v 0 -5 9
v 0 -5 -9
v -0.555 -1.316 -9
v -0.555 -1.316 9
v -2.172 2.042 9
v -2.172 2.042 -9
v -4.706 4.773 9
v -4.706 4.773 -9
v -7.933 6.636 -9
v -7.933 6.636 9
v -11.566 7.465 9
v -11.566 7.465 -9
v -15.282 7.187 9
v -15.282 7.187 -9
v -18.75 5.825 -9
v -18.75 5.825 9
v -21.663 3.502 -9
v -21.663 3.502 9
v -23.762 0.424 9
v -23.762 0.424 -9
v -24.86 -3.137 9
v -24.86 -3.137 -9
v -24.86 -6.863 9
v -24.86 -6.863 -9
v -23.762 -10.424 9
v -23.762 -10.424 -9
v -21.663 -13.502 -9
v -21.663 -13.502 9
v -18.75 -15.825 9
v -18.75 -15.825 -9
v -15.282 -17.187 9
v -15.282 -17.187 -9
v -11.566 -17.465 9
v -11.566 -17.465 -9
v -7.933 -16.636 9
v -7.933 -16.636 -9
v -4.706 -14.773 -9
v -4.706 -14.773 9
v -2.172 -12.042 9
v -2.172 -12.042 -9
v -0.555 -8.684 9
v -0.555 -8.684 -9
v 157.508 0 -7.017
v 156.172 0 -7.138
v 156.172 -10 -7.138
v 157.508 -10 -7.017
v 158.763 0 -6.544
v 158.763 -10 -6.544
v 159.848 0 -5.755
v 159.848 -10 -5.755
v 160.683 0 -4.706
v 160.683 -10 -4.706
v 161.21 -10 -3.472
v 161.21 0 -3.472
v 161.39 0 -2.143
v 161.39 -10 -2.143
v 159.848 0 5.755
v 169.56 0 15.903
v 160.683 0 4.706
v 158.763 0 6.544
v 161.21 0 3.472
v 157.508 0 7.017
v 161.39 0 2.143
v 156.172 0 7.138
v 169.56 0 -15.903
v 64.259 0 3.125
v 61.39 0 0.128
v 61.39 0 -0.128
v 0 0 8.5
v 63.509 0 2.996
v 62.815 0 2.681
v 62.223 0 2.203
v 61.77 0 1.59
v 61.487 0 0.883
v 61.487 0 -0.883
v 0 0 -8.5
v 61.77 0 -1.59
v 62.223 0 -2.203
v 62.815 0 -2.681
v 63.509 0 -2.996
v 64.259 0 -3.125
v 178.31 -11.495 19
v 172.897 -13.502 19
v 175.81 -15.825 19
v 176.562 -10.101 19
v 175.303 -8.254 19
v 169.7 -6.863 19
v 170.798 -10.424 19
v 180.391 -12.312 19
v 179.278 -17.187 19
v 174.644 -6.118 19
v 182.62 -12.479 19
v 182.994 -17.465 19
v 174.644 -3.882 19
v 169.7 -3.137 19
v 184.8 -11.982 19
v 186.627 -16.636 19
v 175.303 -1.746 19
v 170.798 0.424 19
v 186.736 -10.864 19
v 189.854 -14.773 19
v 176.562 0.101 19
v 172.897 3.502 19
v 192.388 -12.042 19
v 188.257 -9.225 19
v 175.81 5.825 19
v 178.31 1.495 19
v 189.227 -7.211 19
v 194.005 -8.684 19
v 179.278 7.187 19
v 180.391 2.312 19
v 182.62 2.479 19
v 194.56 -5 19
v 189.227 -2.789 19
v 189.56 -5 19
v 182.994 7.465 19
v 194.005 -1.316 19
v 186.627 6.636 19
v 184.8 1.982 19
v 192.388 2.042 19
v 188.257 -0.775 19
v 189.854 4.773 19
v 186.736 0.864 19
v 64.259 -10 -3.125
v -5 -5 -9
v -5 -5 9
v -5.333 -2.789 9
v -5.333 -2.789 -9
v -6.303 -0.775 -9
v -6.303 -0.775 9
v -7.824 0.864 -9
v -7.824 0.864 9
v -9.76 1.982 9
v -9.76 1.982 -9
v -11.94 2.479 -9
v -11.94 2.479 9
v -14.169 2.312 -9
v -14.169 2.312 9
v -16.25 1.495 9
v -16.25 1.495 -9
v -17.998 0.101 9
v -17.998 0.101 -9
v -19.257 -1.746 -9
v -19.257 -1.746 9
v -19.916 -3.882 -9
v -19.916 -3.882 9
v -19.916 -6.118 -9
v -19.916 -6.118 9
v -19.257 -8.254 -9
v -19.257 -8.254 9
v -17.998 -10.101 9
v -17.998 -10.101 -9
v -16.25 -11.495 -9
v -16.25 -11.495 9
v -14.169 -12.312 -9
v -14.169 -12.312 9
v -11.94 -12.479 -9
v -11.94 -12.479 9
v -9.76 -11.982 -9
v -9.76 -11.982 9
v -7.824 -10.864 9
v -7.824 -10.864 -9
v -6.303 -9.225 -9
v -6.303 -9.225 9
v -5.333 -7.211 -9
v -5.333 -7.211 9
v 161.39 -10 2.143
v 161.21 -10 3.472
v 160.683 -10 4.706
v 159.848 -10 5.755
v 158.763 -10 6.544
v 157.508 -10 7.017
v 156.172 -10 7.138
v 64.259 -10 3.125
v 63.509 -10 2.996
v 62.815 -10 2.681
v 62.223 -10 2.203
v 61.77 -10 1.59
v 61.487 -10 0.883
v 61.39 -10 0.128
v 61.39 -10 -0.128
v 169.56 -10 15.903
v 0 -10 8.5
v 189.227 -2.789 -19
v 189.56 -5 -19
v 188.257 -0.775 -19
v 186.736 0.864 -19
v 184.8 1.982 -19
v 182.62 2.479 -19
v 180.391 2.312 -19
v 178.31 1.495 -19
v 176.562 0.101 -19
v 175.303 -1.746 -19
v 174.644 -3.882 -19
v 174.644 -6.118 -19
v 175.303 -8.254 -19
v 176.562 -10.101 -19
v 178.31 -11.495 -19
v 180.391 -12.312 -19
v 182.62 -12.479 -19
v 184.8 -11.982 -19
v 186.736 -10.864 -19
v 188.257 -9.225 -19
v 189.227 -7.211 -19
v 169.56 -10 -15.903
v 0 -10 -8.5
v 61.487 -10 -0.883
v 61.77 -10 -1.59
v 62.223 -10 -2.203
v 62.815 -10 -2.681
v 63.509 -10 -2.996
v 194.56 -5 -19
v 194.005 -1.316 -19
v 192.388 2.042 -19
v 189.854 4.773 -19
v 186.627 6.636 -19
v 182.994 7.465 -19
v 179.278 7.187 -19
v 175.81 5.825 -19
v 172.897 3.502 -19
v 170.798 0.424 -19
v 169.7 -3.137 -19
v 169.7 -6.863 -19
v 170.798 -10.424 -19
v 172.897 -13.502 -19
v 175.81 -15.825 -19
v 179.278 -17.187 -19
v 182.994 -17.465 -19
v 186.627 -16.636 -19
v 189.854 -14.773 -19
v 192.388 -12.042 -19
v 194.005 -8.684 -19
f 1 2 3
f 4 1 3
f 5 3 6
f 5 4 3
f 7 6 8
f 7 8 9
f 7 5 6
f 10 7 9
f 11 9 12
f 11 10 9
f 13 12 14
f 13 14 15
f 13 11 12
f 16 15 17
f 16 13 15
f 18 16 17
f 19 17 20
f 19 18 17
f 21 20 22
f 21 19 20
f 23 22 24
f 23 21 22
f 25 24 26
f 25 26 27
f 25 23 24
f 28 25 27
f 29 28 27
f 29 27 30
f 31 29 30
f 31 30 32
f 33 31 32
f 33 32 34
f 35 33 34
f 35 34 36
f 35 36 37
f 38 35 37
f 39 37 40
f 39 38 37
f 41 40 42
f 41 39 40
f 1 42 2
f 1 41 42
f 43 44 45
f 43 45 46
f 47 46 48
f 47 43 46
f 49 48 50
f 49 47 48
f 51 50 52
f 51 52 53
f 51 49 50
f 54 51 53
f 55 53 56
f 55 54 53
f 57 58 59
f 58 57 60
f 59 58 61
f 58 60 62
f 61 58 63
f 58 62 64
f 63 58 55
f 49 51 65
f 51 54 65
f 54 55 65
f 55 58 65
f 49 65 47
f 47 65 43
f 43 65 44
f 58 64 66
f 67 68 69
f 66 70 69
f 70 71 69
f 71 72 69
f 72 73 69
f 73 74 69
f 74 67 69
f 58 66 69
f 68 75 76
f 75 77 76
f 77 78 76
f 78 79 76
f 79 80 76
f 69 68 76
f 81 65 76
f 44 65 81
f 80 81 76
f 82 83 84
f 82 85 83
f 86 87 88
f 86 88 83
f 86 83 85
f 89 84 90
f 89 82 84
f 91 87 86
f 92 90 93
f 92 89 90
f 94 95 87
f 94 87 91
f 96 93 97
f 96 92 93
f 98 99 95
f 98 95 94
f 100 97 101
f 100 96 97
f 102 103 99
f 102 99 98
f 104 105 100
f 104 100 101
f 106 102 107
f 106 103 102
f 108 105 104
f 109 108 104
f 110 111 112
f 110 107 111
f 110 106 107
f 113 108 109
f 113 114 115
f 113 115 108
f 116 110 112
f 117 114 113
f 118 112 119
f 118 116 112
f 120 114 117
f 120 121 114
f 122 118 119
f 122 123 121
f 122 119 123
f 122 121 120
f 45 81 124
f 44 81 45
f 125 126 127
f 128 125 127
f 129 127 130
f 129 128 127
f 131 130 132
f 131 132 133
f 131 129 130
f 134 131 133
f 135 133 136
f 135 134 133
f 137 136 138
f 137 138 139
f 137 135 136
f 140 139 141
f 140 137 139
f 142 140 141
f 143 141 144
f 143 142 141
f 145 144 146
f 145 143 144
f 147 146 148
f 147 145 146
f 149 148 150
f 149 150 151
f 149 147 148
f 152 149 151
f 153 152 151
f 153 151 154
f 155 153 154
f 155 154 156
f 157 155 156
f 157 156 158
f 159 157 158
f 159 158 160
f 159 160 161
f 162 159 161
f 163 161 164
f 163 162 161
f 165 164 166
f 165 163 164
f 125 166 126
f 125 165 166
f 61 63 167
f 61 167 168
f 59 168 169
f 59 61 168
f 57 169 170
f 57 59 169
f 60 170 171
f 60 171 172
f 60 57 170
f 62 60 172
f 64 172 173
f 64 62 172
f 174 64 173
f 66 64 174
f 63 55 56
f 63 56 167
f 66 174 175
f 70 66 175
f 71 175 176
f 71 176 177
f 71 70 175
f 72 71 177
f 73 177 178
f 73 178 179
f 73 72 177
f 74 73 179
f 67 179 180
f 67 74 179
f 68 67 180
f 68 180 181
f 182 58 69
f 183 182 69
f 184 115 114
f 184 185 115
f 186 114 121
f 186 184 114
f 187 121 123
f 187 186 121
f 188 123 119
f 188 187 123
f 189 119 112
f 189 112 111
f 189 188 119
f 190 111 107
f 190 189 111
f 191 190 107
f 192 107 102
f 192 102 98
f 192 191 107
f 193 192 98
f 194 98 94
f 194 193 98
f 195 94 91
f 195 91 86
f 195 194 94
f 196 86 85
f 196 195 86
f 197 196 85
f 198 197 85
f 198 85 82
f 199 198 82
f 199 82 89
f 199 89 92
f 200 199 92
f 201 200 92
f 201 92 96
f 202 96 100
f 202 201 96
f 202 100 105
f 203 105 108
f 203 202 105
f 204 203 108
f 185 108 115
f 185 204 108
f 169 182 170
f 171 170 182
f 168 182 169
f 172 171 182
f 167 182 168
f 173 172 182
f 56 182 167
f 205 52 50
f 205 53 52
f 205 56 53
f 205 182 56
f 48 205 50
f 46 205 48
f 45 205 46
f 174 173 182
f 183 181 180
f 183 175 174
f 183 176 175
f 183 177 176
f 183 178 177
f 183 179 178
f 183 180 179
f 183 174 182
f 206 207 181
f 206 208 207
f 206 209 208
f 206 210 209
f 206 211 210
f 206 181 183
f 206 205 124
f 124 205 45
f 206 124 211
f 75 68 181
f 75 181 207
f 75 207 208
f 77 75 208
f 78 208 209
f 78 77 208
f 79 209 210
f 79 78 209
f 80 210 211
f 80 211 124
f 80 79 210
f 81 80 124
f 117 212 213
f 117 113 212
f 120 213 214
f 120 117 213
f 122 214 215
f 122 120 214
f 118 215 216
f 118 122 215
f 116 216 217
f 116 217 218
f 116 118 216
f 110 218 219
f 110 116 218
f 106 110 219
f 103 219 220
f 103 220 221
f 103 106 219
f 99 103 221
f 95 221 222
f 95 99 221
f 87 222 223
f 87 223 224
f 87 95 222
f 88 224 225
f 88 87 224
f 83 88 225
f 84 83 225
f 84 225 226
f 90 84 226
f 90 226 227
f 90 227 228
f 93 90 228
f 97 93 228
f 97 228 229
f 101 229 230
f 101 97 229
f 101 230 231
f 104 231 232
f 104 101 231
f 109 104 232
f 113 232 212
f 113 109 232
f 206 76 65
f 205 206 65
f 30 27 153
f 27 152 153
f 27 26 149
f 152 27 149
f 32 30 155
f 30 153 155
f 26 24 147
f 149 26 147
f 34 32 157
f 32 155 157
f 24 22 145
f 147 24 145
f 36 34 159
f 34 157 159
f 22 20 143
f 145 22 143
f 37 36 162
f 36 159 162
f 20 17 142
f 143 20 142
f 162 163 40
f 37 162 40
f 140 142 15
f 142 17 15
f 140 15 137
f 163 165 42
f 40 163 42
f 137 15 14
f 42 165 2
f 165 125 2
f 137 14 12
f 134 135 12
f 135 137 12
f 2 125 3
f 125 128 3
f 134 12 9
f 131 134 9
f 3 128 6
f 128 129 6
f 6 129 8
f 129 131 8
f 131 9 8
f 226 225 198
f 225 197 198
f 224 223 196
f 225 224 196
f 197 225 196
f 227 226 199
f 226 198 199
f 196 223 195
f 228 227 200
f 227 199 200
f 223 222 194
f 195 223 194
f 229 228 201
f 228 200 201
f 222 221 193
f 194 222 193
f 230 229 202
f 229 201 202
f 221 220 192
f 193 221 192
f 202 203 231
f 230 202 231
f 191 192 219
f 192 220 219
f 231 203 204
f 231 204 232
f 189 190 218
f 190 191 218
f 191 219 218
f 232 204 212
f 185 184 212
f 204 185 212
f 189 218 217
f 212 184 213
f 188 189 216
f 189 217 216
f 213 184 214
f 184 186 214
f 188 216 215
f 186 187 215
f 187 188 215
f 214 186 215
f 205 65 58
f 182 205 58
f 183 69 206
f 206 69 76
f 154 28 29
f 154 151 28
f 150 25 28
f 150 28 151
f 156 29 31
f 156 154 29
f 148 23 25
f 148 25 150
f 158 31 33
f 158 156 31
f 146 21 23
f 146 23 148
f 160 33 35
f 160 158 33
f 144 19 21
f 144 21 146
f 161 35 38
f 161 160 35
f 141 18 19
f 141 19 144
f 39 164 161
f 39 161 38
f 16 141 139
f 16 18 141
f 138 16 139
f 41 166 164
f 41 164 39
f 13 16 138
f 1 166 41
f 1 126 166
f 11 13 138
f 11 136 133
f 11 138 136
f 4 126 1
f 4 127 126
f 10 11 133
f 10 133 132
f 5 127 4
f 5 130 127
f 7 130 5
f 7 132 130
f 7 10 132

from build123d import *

# Parameters (mm, degrees)
BOSS_EXTRUDE1_DEPTH = 10
SKETCH3_R           = 12.5
SKETCH3_R_2         = 7.5
BOSS_EXTRUDE2_DEPTH = 9
SKETCH4_R           = 12.5
SKETCH4_R_2         = 7.5
BOSS_EXTRUDE3_DEPTH = 19


with BuildPart() as part:
    # Sketch2 → Boss-Extrude1 (new body)
    with BuildSketch(Plane(origin=(0, 0, 0), x_dir=(1, 0, 0), z_dir=(0, 1, 0))):
        Polygon((0, 8.5), (169.56, 15.90314948), (169.56, -15.90314948), (0, -8.5), align=None)
        with BuildLine():
            Line((61.39, 0), (61.39, 0.128124773))
            ThreePointArc((61.39, 0.128124773), (62.222908114, 2.202663941), (64.259141838, 3.125269438))
            Line((64.259141838, 3.125269438), (156.171903063, 7.138267258))
            ThreePointArc((156.171903063, 7.138267258), (159.847565279, 5.754845961), (161.39, 2.14302615))
            Line((161.39, 2.14302615), (161.39, -2.14302615))
            ThreePointArc((161.39, -2.14302615), (159.847565279, -5.754845961), (156.171903063, -7.138267258))
            Line((156.171903063, -7.138267258), (64.259141838, -3.125269438))
            ThreePointArc((64.259141838, -3.125269438), (62.222908114, -2.202663941), (61.39, -0.128124773))
            Line((61.39, -0.128124773), (61.39, 0))
        make_face(mode=Mode.SUBTRACT)
    extrude(amount=-BOSS_EXTRUDE1_DEPTH)


with BuildPart() as body_2:
    # Sketch3 → Boss-Extrude2 (new, symmetric)
    with BuildSketch(Plane.XY):
        with Locations((-12.5, -5)):
            Circle(SKETCH3_R)
        with Locations((-12.5, -5)):
            Circle(SKETCH3_R_2, mode=Mode.SUBTRACT)
    extrude(amount=BOSS_EXTRUDE2_DEPTH, both=True)


with BuildPart() as body_3:
    # Sketch4 → Boss-Extrude3 (new, symmetric)
    with BuildSketch(Plane.XY):
        with Locations((182.06, -5)):
            Circle(SKETCH4_R)
        with Locations((182.06, -5)):
            Circle(SKETCH4_R_2, mode=Mode.SUBTRACT)
    extrude(amount=BOSS_EXTRUDE3_DEPTH, both=True)


solid = Compound([part.part, body_2.part, body_3.part])
